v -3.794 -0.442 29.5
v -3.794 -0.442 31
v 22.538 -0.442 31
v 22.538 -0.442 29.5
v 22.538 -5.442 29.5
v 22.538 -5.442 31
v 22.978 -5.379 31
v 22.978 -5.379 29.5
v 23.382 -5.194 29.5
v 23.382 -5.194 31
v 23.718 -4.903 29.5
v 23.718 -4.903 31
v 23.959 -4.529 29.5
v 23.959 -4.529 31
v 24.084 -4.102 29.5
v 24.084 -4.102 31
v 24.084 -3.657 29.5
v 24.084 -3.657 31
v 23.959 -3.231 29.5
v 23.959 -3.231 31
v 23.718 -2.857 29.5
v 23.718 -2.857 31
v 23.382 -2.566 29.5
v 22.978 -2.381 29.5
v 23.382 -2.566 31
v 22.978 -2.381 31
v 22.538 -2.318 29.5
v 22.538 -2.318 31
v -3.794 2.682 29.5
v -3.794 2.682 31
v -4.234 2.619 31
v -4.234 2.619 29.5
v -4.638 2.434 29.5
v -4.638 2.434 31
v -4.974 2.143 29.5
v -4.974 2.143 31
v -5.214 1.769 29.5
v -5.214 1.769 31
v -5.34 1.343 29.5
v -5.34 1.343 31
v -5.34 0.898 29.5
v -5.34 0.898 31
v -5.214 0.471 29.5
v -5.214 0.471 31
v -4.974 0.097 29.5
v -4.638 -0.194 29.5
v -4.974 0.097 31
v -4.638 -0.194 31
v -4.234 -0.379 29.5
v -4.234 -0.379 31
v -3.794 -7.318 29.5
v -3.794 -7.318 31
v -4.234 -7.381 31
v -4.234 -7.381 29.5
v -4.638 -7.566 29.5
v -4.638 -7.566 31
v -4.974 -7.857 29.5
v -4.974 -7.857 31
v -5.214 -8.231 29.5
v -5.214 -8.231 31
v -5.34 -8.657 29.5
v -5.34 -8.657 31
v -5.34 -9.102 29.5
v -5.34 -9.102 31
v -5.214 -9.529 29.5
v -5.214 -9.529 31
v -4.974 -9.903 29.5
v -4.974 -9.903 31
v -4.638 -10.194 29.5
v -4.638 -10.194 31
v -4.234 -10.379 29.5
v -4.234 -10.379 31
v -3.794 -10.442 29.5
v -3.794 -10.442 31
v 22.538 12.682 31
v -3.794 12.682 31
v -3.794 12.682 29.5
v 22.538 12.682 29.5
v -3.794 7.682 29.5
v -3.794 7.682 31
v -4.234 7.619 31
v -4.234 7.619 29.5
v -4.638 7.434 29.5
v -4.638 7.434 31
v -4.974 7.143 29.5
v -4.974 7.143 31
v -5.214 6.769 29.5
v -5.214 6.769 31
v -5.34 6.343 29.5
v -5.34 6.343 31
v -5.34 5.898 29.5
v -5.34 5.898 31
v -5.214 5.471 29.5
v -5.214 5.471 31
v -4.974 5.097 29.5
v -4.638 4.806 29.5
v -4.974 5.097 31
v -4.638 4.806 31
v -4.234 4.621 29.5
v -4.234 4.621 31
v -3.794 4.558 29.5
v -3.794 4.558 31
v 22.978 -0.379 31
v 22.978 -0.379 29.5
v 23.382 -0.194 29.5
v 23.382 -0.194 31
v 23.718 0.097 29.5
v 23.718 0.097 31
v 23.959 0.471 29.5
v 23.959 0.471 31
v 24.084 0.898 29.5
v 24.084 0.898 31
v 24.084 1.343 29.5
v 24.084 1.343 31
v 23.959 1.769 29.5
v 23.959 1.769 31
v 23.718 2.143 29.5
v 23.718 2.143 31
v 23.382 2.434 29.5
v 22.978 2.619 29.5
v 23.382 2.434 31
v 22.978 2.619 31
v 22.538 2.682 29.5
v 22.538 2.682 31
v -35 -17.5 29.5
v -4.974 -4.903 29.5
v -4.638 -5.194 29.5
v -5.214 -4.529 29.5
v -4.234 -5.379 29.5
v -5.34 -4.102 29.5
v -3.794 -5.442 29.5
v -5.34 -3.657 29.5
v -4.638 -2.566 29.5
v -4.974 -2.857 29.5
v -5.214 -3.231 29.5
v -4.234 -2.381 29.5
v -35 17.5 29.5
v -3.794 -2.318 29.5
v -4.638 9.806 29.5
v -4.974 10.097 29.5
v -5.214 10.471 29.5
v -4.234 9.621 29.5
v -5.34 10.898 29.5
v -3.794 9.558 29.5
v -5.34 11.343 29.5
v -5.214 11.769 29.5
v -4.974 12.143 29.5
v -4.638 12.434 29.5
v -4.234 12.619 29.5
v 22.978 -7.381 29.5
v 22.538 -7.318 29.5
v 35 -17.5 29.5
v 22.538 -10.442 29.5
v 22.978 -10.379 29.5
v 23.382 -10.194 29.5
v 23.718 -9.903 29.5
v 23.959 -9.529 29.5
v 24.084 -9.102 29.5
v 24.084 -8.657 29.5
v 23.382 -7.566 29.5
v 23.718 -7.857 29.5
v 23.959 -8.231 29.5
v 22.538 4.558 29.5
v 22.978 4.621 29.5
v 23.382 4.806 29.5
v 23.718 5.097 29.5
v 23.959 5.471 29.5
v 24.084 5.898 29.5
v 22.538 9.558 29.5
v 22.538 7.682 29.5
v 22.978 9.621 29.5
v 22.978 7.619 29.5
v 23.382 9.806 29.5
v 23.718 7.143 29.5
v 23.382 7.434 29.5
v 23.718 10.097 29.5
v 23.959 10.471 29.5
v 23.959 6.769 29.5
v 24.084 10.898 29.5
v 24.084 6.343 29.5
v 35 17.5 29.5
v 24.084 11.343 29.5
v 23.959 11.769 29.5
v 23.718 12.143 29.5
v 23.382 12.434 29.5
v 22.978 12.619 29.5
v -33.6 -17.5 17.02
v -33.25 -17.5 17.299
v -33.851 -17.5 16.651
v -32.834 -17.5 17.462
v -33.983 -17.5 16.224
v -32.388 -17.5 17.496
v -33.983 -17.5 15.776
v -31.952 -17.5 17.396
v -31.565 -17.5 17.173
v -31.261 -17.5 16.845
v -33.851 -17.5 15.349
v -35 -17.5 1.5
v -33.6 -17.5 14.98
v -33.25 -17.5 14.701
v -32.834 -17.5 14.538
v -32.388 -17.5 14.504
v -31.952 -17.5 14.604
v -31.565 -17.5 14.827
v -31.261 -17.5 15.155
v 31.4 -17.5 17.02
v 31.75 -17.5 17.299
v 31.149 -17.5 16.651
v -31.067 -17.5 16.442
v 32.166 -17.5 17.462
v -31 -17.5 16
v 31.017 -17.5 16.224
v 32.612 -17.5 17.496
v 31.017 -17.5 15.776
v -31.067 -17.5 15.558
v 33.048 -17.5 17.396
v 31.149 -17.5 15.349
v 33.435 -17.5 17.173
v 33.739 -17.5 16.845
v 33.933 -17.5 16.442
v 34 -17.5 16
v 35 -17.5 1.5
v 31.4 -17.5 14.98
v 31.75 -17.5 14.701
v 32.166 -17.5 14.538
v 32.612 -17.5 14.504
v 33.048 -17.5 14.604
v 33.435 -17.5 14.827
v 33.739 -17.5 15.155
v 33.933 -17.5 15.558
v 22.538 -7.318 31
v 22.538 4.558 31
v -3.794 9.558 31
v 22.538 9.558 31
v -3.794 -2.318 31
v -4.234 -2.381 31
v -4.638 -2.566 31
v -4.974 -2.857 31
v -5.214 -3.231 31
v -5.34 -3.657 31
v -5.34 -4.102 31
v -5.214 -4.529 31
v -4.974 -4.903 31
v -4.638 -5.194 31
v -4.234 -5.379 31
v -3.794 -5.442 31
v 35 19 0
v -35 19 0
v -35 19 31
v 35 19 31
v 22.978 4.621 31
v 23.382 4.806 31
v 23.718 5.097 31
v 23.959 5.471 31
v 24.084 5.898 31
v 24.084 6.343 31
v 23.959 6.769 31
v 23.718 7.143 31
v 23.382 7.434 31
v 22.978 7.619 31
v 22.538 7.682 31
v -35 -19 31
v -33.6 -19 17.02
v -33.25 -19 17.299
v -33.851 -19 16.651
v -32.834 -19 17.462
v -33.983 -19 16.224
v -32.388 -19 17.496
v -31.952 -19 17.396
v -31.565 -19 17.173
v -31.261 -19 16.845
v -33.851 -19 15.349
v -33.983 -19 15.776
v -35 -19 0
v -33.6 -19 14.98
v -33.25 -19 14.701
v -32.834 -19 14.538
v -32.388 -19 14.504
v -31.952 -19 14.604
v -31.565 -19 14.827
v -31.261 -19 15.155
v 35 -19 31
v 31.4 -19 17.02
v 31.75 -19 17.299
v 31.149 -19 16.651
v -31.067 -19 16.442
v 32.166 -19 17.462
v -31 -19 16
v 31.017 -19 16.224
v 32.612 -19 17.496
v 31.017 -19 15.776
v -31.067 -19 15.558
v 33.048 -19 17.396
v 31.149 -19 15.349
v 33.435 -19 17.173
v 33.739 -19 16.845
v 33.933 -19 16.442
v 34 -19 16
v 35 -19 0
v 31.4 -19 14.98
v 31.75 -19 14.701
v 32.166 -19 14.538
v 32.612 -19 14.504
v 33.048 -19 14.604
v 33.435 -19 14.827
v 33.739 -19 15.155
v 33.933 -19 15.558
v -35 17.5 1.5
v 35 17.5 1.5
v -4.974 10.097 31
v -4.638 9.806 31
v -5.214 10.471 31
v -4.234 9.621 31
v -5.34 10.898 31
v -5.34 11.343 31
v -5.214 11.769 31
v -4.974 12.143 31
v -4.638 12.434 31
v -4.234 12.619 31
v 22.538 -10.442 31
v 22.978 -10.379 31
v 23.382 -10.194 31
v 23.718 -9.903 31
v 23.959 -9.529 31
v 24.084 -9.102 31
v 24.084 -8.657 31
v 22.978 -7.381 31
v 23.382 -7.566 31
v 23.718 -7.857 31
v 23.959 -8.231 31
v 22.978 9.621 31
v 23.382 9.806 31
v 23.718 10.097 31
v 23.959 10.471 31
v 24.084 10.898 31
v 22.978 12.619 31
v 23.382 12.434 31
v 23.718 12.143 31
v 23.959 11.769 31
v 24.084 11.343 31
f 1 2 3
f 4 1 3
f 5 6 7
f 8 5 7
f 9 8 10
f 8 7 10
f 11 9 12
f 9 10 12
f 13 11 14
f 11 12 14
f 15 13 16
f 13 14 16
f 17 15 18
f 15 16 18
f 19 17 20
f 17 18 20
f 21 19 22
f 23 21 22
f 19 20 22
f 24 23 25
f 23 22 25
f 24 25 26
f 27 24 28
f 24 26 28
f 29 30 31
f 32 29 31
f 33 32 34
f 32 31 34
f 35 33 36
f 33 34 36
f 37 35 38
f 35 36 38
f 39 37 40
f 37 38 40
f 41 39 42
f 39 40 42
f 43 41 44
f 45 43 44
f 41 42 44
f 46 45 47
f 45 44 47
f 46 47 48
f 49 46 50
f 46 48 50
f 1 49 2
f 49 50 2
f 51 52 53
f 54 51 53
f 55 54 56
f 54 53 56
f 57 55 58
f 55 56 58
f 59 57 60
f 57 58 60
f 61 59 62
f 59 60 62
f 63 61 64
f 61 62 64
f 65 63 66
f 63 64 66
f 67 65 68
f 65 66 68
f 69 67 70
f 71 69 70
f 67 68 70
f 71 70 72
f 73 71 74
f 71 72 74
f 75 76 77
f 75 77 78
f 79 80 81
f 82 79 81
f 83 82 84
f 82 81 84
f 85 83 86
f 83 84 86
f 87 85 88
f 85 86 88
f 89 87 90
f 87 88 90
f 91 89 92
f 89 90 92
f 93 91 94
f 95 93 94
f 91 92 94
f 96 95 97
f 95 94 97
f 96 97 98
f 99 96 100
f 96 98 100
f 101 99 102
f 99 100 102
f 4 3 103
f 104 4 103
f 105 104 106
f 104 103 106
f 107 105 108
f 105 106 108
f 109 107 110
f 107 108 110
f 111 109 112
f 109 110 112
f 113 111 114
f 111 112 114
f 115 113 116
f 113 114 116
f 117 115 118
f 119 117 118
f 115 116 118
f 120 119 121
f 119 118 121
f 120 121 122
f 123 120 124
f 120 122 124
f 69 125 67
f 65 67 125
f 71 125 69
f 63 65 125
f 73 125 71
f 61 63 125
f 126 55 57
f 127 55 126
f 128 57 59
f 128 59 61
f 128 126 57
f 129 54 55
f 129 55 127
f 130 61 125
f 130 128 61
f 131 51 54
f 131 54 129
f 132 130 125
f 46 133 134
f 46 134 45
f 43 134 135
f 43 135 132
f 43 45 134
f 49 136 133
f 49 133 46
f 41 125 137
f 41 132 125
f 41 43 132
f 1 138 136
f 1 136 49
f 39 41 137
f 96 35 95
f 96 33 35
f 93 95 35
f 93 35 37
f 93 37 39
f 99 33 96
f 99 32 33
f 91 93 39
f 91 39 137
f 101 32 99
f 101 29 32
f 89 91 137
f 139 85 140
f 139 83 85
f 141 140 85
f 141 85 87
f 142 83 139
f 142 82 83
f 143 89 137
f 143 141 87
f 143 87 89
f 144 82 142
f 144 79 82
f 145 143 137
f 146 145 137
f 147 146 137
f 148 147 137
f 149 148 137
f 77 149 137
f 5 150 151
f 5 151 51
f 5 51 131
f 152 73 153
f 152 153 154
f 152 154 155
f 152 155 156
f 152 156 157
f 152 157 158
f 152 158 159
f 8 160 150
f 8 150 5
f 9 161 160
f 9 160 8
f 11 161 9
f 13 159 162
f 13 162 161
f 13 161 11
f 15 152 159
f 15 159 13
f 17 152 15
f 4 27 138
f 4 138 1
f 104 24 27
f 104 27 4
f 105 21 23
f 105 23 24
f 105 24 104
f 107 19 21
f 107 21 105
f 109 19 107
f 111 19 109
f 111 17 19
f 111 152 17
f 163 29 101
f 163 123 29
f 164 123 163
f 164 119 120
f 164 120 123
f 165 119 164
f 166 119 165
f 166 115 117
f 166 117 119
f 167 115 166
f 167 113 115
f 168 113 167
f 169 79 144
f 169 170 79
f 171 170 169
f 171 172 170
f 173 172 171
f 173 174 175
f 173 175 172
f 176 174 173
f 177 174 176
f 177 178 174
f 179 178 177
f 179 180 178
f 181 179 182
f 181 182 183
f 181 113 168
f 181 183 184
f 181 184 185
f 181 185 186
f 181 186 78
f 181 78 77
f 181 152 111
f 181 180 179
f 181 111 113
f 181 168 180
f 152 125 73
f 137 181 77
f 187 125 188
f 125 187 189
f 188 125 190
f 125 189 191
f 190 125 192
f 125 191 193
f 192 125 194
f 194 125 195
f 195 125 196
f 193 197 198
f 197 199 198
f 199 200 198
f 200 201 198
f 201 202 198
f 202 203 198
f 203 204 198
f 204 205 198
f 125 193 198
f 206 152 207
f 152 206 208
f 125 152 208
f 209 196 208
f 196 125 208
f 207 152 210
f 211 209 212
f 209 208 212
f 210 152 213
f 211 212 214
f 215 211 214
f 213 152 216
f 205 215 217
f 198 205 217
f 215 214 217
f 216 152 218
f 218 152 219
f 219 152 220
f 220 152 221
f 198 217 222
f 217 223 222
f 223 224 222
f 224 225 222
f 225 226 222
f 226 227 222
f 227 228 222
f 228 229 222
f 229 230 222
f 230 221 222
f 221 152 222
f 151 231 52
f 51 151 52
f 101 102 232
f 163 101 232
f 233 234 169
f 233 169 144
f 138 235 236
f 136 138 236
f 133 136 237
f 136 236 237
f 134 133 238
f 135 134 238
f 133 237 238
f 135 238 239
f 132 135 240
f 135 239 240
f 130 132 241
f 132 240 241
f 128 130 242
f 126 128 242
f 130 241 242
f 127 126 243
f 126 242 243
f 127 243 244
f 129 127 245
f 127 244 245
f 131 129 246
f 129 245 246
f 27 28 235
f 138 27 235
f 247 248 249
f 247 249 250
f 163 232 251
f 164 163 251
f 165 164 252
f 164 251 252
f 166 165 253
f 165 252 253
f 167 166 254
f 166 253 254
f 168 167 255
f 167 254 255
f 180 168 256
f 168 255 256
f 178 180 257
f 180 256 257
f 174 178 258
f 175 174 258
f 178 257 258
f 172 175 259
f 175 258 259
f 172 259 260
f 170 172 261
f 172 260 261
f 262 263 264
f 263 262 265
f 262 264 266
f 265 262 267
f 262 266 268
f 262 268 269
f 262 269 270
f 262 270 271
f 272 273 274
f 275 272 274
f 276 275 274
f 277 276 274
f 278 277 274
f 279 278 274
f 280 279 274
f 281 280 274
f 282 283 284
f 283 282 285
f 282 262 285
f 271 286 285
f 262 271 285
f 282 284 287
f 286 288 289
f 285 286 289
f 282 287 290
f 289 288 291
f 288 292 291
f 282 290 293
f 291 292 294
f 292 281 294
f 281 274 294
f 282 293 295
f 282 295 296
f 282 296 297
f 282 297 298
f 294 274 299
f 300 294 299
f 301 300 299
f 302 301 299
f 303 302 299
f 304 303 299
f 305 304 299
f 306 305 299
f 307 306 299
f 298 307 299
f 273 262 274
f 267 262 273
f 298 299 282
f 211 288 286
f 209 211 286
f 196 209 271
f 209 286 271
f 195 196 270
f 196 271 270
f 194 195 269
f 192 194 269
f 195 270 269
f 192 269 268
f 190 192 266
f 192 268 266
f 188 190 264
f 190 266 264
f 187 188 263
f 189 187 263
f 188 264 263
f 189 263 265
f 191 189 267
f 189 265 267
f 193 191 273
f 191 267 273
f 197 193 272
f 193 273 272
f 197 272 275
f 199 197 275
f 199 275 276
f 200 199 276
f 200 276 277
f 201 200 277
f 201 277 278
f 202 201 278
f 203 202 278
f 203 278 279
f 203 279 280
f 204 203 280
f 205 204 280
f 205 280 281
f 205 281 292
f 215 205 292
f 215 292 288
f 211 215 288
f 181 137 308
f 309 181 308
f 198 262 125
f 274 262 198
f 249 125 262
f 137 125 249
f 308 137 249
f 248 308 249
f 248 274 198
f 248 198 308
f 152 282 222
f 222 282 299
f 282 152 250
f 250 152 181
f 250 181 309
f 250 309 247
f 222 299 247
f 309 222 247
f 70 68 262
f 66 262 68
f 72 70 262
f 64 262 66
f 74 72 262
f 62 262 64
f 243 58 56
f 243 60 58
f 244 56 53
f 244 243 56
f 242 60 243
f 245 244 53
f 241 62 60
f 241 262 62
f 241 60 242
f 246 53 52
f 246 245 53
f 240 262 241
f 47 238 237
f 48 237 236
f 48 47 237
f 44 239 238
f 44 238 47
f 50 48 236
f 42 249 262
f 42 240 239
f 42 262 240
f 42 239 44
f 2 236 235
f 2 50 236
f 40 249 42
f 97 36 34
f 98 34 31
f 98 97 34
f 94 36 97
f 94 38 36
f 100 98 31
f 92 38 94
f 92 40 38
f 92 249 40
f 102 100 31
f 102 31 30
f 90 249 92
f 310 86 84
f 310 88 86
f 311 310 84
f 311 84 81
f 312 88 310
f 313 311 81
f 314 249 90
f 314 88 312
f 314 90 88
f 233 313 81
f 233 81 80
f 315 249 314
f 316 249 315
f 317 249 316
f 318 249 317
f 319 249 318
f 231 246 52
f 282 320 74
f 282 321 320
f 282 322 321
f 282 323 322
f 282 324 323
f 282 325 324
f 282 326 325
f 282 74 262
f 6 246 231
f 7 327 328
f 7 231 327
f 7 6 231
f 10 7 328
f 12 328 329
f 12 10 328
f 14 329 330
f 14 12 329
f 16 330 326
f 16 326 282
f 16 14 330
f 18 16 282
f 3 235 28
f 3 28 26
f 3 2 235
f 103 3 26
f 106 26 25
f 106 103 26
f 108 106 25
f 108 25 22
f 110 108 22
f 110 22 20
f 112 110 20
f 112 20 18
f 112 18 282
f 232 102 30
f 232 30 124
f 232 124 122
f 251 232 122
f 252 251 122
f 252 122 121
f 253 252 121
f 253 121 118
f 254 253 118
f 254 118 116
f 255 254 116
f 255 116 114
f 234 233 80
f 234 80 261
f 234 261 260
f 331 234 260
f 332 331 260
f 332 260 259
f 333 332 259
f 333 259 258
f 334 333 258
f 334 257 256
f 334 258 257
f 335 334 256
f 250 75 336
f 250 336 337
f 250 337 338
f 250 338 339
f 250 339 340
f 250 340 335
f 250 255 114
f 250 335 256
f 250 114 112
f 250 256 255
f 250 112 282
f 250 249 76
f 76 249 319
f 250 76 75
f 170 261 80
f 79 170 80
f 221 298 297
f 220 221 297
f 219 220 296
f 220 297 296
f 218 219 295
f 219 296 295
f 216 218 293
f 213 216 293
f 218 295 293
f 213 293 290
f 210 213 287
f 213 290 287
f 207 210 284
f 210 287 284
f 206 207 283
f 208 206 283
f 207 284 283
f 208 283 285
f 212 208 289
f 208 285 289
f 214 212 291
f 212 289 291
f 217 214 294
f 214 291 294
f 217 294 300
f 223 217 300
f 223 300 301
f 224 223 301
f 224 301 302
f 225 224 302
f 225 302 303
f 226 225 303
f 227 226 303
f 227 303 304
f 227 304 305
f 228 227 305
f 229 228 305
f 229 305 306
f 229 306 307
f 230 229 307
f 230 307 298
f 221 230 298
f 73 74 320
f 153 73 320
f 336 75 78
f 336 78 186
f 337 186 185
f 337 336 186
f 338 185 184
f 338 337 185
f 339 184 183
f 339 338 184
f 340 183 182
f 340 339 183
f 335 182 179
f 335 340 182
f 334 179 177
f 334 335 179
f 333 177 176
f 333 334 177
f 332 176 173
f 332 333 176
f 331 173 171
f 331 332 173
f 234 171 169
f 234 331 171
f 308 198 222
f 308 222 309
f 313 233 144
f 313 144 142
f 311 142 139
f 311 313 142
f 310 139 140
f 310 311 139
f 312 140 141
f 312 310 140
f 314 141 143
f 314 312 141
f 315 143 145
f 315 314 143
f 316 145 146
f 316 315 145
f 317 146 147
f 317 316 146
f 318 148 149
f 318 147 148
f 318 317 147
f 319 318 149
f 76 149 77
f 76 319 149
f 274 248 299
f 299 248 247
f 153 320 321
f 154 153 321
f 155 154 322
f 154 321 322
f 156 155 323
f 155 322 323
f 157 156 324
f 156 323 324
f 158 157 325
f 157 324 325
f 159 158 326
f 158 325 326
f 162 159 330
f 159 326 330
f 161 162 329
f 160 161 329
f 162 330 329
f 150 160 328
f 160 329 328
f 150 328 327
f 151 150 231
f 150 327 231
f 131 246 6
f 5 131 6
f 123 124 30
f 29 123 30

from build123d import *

# Parameters (mm, degrees)
SKETCH_1_W          = 70
SKETCH_1_H          = 38
EXTRUDE_1_DEPTH     = 31
SKETCH_2_W          = 28
SKETCH_2_H          = 35
CUT_EXTRUDE_1_DEPTH = 71
CUT_EXTRUDE_3_DEPTH = 2
SKETCH_5_R          = 1.5
CUT_EXTRUDE_4_DEPTH = 2


with BuildPart() as part:
    # 草图1 → 凸台-拉伸1 (new body)
    with BuildSketch(Plane.XY):
        Rectangle(SKETCH_1_W, SKETCH_1_H)
    extrude(amount=EXTRUDE_1_DEPTH)

    # 草图2 → 切除-拉伸1 (cut, through all)
    with BuildSketch(Plane(origin=(35, 0, 0), x_dir=(0, 0, -1), z_dir=(1, 0, 0))):
        with Locations((-15.5, 0)):
            Rectangle(SKETCH_2_W, SKETCH_2_H)
    extrude(amount=-CUT_EXTRUDE_1_DEPTH, mode=Mode.SUBTRACT)

    # 草图4 → 切除-拉伸3 (cut)
    with BuildSketch(Plane.XY.offset(31)):
        with BuildLine():
            Line((-3.793519022, 12.68225477), (22.537965955, 12.68225477))
            ThreePointArc((22.537965955, 12.68225477), (24.1000032, 11.120217526), (22.537965955, 9.558180281))
            Line((22.537965955, 9.558180281), (-3.793519022, 9.558180281))
            ThreePointArc((-3.793519022, 9.558180281), (-5.355556267, 11.120217526), (-3.793519022, 12.68225477))
        make_face()
        with BuildLine():
            Line((-3.793519022, 4.558180281), (22.537965955, 4.558180281))
            ThreePointArc((22.537965955, 4.558180281), (24.1000032, 6.120217526), (22.537965955, 7.68225477))
            Line((22.537965955, 7.68225477), (-3.793519022, 7.68225477))
            ThreePointArc((-3.793519022, 7.68225477), (-5.355556267, 6.120217526), (-3.793519022, 4.558180281))
        make_face()
        with BuildLine():
            Line((-3.793519022, -0.441819719), (22.537965955, -0.441819719))
            ThreePointArc((22.537965955, -0.441819719), (24.1000032, 1.120217526), (22.537965955, 2.68225477))
            Line((22.537965955, 2.68225477), (-3.793519022, 2.68225477))
            ThreePointArc((-3.793519022, 2.68225477), (-5.355556267, 1.120217526), (-3.793519022, -0.441819719))
        make_face()
        with BuildLine():
            Line((-3.793519022, -5.441819719), (22.537965955, -5.441819719))
            ThreePointArc((22.537965955, -5.441819719), (24.1000032, -3.879782474), (22.537965955, -2.31774523))
            Line((22.537965955, -2.31774523), (-3.793519022, -2.31774523))
            ThreePointArc((-3.793519022, -2.31774523), (-5.355556267, -3.879782474), (-3.793519022, -5.441819719))
        make_face()
        with BuildLine():
            Line((-3.793519022, -10.441819719), (22.537965955, -10.441819719))
            ThreePointArc((22.537965955, -10.441819719), (24.1000032, -8.879782474), (22.537965955, -7.31774523))
            Line((22.537965955, -7.31774523), (-3.793519022, -7.31774523))
            ThreePointArc((-3.793519022, -7.31774523), (-5.355556267, -8.879782474), (-3.793519022, -10.441819719))
        make_face()
    extrude(amount=-CUT_EXTRUDE_3_DEPTH, mode=Mode.SUBTRACT)

    # 草图5 → 切除-拉伸4 (cut)
    with BuildSketch(Plane.XZ.offset(19)):
        with Locations((-32.5, 16)):
            Circle(SKETCH_5_R)
        with Locations((32.5, 16)):
            Circle(SKETCH_5_R)
    extrude(amount=-CUT_EXTRUDE_4_DEPTH, mode=Mode.SUBTRACT)


solid = part.part
